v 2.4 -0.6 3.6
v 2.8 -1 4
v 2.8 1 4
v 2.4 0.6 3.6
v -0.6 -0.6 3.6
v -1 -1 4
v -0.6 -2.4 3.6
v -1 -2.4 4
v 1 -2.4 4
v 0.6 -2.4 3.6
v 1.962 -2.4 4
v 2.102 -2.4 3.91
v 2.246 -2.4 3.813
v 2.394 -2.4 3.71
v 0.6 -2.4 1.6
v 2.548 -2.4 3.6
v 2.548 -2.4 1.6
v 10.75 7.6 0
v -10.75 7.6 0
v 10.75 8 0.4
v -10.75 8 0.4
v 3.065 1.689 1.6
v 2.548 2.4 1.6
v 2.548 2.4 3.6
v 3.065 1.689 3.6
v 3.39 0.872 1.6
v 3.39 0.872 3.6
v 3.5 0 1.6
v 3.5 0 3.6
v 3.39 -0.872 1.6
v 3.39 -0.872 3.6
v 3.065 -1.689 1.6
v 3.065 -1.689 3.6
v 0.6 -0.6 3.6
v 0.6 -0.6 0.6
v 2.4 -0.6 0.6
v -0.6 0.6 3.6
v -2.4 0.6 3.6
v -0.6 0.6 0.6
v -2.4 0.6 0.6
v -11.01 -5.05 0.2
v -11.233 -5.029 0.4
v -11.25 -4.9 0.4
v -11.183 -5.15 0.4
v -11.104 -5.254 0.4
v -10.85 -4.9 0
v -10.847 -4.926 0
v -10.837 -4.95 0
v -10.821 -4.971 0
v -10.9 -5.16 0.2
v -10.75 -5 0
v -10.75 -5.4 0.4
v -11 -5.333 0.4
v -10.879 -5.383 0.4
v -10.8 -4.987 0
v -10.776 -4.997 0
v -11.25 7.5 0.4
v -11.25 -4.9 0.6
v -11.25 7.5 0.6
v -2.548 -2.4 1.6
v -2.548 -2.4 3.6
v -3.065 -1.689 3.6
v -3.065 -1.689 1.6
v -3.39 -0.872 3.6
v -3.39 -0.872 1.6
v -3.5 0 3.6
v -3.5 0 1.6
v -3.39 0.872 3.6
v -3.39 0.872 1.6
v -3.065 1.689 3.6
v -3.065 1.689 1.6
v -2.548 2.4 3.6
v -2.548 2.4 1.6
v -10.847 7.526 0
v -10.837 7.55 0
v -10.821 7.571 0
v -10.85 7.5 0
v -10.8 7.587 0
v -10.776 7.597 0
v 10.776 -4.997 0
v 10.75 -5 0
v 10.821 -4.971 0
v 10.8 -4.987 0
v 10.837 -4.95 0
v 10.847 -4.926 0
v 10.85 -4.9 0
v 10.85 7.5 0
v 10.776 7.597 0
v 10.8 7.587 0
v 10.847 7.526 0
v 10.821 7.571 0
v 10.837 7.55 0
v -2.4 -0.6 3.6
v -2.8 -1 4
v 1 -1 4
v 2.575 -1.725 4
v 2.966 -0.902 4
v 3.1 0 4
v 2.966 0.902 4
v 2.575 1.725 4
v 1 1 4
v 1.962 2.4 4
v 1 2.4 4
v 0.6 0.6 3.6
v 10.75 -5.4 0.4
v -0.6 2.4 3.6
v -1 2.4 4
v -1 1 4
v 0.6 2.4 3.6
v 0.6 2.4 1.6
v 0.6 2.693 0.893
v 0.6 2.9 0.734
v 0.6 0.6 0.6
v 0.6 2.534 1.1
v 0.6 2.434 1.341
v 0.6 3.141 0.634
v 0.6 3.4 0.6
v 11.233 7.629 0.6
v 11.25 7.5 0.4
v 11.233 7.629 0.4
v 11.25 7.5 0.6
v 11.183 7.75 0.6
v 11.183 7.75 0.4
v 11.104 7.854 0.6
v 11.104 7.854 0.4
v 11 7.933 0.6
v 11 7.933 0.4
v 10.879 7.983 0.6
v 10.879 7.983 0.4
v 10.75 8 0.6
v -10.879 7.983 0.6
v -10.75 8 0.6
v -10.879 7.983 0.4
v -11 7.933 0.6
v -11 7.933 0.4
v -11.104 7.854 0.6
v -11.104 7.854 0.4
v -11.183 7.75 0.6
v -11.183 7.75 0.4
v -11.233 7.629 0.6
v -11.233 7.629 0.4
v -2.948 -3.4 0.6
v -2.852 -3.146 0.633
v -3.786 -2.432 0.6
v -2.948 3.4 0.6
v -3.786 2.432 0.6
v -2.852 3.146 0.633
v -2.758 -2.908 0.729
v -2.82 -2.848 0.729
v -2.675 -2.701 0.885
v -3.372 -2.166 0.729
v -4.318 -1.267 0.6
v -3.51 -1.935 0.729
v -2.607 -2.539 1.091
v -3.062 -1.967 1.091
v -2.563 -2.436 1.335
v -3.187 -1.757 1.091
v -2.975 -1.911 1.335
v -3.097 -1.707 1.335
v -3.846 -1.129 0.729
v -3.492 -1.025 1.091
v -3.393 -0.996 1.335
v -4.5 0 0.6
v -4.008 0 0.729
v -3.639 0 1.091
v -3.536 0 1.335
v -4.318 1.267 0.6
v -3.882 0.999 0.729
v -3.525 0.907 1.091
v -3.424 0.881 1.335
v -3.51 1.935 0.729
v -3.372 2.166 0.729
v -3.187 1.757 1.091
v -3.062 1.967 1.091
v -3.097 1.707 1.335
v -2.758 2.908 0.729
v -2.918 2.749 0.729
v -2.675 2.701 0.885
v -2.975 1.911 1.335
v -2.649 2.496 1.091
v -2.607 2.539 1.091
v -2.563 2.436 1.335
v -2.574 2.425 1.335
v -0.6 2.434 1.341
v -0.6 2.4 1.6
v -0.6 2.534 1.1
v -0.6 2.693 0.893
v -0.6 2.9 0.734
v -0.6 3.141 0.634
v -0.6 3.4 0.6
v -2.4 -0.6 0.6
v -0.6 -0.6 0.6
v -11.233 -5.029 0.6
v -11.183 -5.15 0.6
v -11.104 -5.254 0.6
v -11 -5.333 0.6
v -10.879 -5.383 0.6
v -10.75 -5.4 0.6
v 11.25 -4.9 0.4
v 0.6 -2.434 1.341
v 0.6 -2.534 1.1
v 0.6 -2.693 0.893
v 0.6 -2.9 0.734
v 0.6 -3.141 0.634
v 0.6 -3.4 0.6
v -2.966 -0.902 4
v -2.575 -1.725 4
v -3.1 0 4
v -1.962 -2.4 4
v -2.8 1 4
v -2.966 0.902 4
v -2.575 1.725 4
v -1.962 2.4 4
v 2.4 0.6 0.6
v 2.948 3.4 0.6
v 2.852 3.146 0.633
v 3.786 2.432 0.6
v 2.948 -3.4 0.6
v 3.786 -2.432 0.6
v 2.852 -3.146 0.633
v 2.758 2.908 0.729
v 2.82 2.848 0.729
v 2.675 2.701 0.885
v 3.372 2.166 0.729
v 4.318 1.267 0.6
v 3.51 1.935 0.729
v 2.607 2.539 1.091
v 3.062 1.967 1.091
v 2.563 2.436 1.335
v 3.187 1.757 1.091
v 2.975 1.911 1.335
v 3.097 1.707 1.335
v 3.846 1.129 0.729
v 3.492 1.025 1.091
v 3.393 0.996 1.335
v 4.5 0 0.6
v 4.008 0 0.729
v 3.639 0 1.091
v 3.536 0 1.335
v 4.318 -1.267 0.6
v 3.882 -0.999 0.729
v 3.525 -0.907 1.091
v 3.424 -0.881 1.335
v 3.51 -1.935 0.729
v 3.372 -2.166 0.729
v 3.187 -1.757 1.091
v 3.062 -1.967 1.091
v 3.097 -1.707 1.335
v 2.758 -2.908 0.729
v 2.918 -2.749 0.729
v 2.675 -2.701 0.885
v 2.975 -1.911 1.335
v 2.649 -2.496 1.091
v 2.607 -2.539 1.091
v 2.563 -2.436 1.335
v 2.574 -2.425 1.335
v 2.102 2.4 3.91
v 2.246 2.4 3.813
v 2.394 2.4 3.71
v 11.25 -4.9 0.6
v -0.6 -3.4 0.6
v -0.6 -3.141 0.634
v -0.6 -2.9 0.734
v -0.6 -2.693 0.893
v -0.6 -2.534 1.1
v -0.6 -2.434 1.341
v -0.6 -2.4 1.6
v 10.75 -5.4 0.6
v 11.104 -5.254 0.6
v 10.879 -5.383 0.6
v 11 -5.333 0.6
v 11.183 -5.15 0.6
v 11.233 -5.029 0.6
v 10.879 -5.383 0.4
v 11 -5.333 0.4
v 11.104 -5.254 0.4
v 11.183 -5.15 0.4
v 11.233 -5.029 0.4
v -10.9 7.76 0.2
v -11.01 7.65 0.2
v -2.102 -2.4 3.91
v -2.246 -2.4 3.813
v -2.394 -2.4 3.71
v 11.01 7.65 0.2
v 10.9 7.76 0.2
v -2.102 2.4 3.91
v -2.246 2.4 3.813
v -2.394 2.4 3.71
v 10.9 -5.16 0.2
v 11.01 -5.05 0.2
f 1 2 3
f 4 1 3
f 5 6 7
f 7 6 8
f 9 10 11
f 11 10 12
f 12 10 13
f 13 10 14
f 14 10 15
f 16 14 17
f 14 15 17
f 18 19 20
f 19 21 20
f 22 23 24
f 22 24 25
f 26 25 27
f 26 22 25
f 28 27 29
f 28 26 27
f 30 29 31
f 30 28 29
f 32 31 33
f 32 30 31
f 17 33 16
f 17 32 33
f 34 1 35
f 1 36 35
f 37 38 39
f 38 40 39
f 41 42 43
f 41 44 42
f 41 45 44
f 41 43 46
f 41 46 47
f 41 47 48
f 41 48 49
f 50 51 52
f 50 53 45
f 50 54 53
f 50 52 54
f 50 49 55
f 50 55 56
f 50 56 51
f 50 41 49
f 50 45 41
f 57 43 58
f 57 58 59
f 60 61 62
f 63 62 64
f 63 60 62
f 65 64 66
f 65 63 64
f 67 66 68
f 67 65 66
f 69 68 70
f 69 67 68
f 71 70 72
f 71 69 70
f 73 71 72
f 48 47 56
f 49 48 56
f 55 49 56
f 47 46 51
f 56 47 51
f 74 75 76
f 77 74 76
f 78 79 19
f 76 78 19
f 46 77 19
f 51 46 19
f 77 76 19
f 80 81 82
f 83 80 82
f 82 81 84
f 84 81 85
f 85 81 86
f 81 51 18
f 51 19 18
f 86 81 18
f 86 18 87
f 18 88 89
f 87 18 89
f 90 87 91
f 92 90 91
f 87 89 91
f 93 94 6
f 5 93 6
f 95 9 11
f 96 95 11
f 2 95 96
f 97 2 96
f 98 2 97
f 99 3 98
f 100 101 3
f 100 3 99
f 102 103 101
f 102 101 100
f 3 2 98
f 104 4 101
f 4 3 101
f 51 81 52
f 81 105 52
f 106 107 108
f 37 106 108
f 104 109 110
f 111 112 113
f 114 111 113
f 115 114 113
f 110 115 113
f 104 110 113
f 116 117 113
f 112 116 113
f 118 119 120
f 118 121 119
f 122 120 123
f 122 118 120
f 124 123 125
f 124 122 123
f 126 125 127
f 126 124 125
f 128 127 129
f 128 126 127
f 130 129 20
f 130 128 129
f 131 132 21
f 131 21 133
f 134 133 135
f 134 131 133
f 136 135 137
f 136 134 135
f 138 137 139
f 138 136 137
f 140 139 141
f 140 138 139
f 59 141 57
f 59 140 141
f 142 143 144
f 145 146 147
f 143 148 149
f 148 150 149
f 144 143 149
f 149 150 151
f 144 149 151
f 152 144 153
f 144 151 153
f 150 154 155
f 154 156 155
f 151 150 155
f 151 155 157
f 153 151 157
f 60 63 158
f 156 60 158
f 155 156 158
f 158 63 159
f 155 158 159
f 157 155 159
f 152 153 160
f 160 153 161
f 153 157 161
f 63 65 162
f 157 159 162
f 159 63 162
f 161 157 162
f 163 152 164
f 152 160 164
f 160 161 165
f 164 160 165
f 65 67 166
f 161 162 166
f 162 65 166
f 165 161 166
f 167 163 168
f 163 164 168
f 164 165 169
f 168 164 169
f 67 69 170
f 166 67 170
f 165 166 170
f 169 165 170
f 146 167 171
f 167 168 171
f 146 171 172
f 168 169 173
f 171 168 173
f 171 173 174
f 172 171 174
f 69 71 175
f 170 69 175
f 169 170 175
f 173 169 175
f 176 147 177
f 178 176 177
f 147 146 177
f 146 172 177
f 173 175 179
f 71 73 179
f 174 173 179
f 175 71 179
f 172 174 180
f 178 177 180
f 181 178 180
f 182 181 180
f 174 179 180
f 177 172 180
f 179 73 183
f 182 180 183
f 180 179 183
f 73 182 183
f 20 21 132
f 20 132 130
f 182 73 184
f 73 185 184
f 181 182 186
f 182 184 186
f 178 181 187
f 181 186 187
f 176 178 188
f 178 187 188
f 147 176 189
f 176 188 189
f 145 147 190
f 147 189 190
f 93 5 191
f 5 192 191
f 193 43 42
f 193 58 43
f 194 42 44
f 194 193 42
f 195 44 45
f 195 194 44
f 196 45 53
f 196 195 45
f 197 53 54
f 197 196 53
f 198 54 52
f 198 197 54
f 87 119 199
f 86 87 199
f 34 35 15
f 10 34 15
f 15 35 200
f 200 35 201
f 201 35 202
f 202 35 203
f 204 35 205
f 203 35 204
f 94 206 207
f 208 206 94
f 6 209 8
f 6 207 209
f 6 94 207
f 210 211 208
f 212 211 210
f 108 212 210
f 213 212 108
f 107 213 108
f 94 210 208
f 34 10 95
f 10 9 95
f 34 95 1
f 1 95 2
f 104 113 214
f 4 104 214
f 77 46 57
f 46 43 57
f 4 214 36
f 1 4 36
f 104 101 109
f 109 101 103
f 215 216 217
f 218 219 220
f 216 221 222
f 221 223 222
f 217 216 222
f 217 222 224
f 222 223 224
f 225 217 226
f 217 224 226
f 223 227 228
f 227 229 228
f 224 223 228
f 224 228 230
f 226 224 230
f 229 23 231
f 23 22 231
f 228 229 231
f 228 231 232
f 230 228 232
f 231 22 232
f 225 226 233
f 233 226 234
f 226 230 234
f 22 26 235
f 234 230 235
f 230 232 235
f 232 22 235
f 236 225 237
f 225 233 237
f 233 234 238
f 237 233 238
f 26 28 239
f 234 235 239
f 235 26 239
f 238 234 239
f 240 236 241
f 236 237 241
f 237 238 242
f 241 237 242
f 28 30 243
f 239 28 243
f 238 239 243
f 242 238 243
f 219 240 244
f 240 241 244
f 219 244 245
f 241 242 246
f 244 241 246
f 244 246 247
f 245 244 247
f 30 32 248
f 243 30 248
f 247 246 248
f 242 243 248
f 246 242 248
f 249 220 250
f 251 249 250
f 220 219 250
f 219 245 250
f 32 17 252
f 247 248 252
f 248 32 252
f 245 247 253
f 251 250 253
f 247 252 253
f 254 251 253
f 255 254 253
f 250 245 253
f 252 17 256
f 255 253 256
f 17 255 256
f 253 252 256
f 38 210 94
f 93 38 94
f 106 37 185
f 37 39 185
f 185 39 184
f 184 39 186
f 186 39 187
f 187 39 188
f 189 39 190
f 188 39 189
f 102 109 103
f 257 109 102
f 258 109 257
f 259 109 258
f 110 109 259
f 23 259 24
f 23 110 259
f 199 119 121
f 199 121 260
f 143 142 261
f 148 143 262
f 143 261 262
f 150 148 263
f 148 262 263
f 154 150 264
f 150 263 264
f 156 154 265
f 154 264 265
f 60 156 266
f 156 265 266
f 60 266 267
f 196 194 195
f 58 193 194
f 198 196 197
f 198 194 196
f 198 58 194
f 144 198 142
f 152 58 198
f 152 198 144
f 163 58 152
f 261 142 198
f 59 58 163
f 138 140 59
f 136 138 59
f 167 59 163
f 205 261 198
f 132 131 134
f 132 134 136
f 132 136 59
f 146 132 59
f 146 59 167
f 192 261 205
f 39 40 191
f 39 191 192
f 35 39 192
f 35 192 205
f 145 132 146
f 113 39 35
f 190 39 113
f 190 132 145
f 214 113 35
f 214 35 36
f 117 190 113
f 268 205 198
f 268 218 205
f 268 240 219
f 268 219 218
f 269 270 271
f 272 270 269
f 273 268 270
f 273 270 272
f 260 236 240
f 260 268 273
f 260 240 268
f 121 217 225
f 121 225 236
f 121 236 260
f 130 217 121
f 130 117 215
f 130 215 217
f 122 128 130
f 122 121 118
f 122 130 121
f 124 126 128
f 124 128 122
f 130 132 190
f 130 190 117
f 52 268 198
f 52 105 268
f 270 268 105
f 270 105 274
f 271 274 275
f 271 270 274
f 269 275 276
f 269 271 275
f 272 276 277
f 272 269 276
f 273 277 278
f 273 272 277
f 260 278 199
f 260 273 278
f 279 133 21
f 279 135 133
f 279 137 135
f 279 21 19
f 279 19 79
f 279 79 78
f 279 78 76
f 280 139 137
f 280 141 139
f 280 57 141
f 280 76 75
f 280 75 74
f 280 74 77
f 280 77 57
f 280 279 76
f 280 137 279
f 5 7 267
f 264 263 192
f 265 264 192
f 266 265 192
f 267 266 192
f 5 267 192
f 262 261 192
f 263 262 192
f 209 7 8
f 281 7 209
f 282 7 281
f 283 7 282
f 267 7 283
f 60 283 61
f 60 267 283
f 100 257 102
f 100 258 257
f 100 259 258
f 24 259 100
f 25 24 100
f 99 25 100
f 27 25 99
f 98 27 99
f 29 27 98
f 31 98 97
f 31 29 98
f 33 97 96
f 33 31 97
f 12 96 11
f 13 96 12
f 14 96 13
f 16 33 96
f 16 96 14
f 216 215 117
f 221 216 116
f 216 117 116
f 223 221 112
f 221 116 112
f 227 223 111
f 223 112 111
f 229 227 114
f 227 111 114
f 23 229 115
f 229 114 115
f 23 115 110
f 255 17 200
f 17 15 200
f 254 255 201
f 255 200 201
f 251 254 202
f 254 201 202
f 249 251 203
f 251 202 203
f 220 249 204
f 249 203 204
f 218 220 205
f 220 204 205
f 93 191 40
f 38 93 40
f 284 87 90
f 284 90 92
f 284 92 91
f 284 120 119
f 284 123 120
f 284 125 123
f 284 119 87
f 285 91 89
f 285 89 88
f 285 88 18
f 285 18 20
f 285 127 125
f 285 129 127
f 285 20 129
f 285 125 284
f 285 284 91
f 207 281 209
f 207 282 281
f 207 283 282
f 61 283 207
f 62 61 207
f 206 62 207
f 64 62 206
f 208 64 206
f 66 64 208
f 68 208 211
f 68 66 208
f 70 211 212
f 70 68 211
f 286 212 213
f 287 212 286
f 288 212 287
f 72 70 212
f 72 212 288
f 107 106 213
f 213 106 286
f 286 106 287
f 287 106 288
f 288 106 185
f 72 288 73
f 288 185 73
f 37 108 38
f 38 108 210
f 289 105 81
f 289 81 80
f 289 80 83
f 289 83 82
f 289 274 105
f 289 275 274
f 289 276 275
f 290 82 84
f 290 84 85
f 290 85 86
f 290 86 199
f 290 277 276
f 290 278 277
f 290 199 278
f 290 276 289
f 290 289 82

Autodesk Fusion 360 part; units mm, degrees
sketch "Sketch1" plane through (0, 0, 0) normal (0, 0, 1) x (1, 0, 0)
  line L0 (13.85, 9) -> (-13.85, 9) construction
  line L1 (-13.85, 9) -> (-13.85, -9) construction
  line L2 (-13.85, -9) -> (13.85, -9) construction
  line L3 (13.85, -9) -> (13.85, 9) construction
  line L4 (13.85, 9) -> (-13.85, -9) construction
  line L5 (-13.85, 9) -> (13.85, -9) construction
  line L6 (-11.25, 8) -> (11.25, 8)
  line L7 (11.25, 8) -> (11.25, -5.4)
  line L8 (11.25, -5.4) -> (-11.25, -5.4)
  line L9 (-11.25, -5.4) -> (-11.25, 8)
  circle A0 centre (0, 0) radius 3.5
  line L10 (2.4, -0.6) -> (-2.4, -0.6)
  line L11 (-2.4, -0.6) -> (-2.4, 0.6)
  line L12 (-2.4, 0.6) -> (2.4, 0.6)
  line L13 (2.4, 0.6) -> (2.4, -0.6)
  line L14 (2.4, -0.6) -> (-2.4, 0.6) construction
  line L15 (-2.4, -0.6) -> (2.4, 0.6) construction
  line L16 (0.6, -2.4) -> (-0.6, -2.4)
  line L17 (-0.6, -2.4) -> (-0.6, 2.4)
  line L18 (-0.6, 2.4) -> (0.6, 2.4)
  line L19 (0.6, 2.4) -> (0.6, -2.4)
  line L20 (0.6, -2.4) -> (-0.6, 2.4) construction
  line L21 (-0.6, -2.4) -> (0.6, 2.4) construction
  line L22 (-0.6, 2.4) -> (-2.5475, 2.4)
  line L23 (0.6, 2.4) -> (2.5475, 2.4)
  line L24 (-0.6, -2.4) -> (-2.5475, -2.4)
  line L25 (0.6, -2.4) -> (2.5475, -2.4)
  dimension "d1" = 27.7
  dimension "d2" = 18
  dimension "d3" = 3.6
  dimension "d4" = 1
  dimension "d5" = 2.6
  dimension "d6" = 2.6
  dimension "d7" = 7
  dimension "d8" = 4.8
  dimension "d9" = 1.2
  dimension "d10" = 1.2
  dimension "d11" = 4.8
extrude "Extrude1" add sketch "Sketch1" along normal blind 0.6 contours L6 L7 L8 L9 | A0 L10 L12 L13 L19 L23 L25 | A0 L18 L22 L23 | A0 L16 L24 L25 | A0 L10 L11 L12 L17 L22 L24 | L12 L17 L18 L19 | L10 L16 L17 L19 | L10 L12 L17 L19 | L10 L12 L13 L19 | L10 L11 L12 L17
extrude "Extrude2" add sketch "Sketch1" along normal blind 4 contours A0 L10 L12 L13 L19 L23 L25 | A0 L10 L11 L12 L17 L22 L24
fillet "Fillet1" radius 1 6 edges at (-1.5738, -2.4, 0.6) (-3.5, 0, 0.6) (1.5738, -2.4, 0.6) (3.5, 0, 0.6) (1.5738, 2.4, 0.6) (-1.5738, 2.4, 0.6)
fillet "Fillet1" radius 0.5 4 edges at (11.25, 8, 0.3) (-11.25, 8, 0.3) (11.25, -5.4, 0.3) (-11.25, -5.4, 0.3)
chamfer "Chamfer1" distance 0.4 angle 45 20 edges at (-11.1036, 7.8536, 0) (0, 8, 0) (11.1036, 7.8536, 0) (11.25, 1.3, 0) (11.1036, -5.2536, 0) (0, -5.4, 0) (-11.1036, -5.2536, 0) (-11.25, 1.3, 0) (-0.6, 1.5, 4) (-1.5, 0.6, 4) (-2.4, 0, 4) (-1.5, -0.6, 4) (-0.6, -1.5, 4) (0.6, -1.5, 4) (1.5, -0.6, 4) (2.4, 0, 4) (1.5, 0.6, 4) (0.6, 1.5, 4) (3.5, 0, 4) (-3.5, 0, 4)
